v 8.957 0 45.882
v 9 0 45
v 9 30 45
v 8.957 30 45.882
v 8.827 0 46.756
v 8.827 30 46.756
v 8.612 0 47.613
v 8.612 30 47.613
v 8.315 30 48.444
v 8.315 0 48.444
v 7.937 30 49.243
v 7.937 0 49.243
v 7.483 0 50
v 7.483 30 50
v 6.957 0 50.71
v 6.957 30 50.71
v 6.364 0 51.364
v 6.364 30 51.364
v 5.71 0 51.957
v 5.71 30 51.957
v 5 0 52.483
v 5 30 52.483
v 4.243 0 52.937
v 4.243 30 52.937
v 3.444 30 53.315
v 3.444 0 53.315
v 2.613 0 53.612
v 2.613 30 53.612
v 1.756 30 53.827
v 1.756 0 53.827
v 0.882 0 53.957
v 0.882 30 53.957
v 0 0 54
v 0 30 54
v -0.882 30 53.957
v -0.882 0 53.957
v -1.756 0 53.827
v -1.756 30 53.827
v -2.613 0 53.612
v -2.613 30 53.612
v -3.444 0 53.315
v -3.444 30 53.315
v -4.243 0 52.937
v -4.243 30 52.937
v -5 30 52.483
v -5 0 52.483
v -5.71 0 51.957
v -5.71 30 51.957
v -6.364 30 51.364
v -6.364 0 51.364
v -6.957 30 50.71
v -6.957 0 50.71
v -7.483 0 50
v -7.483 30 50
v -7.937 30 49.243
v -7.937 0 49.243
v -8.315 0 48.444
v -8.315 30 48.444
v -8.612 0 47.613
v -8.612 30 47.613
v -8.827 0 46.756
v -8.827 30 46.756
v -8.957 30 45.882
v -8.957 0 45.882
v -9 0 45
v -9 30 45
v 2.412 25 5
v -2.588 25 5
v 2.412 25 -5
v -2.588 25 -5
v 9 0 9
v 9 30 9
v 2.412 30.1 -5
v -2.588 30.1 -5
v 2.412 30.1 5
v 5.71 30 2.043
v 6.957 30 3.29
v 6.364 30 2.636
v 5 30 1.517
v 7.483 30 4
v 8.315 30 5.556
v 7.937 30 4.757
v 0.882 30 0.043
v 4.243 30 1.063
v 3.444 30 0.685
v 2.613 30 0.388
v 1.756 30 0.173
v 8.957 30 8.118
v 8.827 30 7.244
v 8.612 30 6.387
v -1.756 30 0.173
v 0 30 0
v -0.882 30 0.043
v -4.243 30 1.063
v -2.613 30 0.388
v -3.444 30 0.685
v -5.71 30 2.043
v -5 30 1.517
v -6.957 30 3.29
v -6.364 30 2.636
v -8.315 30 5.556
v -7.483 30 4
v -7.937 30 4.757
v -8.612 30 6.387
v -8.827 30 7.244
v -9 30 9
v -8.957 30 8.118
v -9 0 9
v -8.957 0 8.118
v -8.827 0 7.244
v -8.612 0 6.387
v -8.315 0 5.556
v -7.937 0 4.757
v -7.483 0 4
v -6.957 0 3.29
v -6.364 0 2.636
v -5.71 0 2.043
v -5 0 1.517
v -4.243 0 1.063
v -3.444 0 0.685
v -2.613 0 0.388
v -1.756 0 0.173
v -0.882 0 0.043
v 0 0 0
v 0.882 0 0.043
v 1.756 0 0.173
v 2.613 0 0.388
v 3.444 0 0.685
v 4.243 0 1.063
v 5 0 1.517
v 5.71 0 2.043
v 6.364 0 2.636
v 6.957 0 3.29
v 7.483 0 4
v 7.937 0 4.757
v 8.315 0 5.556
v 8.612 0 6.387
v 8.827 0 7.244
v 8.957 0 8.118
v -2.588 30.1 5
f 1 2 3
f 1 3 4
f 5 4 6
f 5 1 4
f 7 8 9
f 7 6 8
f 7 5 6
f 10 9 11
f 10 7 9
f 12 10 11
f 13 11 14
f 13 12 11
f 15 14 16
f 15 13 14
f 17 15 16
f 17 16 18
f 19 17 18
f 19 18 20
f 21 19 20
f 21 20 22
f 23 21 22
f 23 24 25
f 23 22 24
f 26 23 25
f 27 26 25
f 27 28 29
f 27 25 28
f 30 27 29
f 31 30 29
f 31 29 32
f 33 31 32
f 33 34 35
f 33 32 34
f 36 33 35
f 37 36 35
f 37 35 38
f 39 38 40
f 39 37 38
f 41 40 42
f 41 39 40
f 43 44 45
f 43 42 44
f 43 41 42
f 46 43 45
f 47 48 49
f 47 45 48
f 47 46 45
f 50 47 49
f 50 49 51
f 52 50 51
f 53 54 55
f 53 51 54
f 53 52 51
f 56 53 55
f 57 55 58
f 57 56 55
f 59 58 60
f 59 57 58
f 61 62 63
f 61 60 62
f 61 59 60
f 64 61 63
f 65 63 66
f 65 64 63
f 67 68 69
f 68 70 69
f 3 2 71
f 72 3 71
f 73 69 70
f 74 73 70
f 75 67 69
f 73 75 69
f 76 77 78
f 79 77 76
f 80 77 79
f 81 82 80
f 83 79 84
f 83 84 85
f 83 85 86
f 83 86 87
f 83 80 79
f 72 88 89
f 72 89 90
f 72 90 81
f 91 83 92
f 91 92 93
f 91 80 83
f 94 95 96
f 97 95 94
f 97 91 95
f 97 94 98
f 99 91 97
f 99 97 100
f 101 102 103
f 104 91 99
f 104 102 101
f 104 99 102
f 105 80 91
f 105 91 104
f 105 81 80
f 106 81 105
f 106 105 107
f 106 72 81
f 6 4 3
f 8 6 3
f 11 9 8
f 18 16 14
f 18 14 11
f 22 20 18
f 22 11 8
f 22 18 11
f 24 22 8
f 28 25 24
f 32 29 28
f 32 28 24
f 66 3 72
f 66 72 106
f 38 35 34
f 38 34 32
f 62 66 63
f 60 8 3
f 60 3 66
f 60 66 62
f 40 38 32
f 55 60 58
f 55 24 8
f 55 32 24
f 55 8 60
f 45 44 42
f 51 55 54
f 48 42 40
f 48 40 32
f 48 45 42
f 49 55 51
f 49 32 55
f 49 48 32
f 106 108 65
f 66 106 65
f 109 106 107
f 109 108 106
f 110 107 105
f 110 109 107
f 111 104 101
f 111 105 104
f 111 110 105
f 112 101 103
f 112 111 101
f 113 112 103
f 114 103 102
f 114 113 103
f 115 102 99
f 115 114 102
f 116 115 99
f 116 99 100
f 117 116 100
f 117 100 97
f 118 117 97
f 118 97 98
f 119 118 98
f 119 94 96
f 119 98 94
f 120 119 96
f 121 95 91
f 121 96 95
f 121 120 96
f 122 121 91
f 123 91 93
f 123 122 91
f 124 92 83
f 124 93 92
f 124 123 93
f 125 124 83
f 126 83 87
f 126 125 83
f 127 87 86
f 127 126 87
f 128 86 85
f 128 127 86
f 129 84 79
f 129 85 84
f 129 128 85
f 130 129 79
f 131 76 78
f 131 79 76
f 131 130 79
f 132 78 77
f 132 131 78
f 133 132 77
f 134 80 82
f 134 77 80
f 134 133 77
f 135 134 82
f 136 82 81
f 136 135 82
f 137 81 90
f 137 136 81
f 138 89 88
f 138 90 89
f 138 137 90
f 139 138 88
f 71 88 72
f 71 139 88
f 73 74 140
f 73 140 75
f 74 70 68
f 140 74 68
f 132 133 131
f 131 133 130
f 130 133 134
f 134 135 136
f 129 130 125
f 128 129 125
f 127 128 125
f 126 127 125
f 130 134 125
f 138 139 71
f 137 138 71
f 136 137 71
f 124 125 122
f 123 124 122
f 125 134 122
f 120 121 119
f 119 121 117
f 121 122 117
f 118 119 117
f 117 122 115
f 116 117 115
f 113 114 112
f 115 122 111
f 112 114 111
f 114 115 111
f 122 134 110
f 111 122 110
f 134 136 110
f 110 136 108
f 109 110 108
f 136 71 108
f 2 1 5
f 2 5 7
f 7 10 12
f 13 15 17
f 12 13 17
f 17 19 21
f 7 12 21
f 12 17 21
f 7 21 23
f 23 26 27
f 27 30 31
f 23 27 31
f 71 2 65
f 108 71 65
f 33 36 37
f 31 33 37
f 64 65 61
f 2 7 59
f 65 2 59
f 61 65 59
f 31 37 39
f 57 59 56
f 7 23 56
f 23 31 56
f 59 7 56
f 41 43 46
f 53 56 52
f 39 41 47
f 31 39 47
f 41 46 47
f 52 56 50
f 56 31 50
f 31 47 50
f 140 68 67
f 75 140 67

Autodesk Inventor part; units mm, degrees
ref_plane "YZ Plane" through (0, 0, 0) normal (1, 0, 0) x (0, 1, 0)
ref_plane "XZ Plane" through (0, 0, 0) normal (0, 1, 0) x (-1, 0, 0)
ref_plane "XY Plane" through (0, 0, 0) normal (0, 0, 1) x (1, 0, 0)
sketch "Sketch1" plane through (0, 0, 0) normal (0, 1, 0) x (-1, 0, 0)
  line L0 (0, 54) -> (0, 0) construction
  line L1 (-9, 45) -> (-9, 9)
  line L2 (9, 9) -> (9, 45)
  arc A0 (9, 45) -> (-9, 45) centre (0, 45) ccw
  arc A1 (-9, 9) -> (9, 9) centre (0, 9) ccw
  point P0 (0, 27)
  dimension "d0" = 54
  dimension "d1" = 18
extrude "Extrusion1" add sketch "Sketch1" along normal blind 30
sketch "Sketch2" plane through (0, 30, 0) normal (0, 1, 0) x (1, 0, 0)
  line L0 (-2.5878, -5) -> (2.4122, -5)
  line L1 (2.4122, -5) -> (2.4122, 5)
  line L2 (2.4122, 5) -> (-2.5878, 5)
  line L3 (-2.5878, 5) -> (-2.5878, -5)
  point P0 (0, 0)
  dimension "d4" = 5
  dimension "d5" = 10
  dimension "d6" = 5
extrude "Extrusion2" add sketch "Sketch2" along normal blind 0.1 and the other way blind 5 separate body
properties part number "battery_small"
